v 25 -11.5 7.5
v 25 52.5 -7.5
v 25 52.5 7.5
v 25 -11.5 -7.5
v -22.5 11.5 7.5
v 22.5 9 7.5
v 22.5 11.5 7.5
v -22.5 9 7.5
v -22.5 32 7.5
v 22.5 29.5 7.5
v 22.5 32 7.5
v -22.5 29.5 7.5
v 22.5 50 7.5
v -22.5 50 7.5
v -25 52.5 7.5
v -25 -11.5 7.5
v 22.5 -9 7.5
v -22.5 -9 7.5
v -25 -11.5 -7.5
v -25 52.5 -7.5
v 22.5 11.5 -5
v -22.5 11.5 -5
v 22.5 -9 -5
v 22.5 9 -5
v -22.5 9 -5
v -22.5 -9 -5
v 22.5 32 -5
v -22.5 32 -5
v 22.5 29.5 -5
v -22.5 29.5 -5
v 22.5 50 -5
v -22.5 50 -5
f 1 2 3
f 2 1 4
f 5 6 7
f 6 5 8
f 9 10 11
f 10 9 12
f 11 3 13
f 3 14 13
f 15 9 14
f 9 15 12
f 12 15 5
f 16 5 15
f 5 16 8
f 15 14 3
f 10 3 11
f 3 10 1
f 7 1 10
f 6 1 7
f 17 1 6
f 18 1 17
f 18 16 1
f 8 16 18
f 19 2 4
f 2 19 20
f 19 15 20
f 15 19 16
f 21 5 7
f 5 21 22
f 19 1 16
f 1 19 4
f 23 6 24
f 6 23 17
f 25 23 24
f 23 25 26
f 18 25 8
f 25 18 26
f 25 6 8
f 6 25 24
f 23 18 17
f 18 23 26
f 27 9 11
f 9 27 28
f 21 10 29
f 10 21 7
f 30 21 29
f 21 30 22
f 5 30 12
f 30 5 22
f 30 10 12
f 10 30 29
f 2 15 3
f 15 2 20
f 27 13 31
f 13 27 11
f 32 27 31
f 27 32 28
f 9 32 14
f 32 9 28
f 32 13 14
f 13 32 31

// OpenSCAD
l = 45;
w = 18;
h = 10;
border = 5;

union(){
    difference(){
        cube([l+border,w+border,h+border],true);
        translate([0,0,border/2])
        cube([l,w,h+border],true);
    }
    translate([0,w+(border/2),0])
    difference(){
        cube([l+border,w+border,h+border],true);
        translate([0,0,border/2])
        cube([l,w,h+border],true);
    }
    translate([0,(w+(border/2))*2,0])
    difference(){
        cube([l+border,w+border,h+border],true);
        translate([0,0,border/2])
        cube([l,w,h+border],true);
    }
}
